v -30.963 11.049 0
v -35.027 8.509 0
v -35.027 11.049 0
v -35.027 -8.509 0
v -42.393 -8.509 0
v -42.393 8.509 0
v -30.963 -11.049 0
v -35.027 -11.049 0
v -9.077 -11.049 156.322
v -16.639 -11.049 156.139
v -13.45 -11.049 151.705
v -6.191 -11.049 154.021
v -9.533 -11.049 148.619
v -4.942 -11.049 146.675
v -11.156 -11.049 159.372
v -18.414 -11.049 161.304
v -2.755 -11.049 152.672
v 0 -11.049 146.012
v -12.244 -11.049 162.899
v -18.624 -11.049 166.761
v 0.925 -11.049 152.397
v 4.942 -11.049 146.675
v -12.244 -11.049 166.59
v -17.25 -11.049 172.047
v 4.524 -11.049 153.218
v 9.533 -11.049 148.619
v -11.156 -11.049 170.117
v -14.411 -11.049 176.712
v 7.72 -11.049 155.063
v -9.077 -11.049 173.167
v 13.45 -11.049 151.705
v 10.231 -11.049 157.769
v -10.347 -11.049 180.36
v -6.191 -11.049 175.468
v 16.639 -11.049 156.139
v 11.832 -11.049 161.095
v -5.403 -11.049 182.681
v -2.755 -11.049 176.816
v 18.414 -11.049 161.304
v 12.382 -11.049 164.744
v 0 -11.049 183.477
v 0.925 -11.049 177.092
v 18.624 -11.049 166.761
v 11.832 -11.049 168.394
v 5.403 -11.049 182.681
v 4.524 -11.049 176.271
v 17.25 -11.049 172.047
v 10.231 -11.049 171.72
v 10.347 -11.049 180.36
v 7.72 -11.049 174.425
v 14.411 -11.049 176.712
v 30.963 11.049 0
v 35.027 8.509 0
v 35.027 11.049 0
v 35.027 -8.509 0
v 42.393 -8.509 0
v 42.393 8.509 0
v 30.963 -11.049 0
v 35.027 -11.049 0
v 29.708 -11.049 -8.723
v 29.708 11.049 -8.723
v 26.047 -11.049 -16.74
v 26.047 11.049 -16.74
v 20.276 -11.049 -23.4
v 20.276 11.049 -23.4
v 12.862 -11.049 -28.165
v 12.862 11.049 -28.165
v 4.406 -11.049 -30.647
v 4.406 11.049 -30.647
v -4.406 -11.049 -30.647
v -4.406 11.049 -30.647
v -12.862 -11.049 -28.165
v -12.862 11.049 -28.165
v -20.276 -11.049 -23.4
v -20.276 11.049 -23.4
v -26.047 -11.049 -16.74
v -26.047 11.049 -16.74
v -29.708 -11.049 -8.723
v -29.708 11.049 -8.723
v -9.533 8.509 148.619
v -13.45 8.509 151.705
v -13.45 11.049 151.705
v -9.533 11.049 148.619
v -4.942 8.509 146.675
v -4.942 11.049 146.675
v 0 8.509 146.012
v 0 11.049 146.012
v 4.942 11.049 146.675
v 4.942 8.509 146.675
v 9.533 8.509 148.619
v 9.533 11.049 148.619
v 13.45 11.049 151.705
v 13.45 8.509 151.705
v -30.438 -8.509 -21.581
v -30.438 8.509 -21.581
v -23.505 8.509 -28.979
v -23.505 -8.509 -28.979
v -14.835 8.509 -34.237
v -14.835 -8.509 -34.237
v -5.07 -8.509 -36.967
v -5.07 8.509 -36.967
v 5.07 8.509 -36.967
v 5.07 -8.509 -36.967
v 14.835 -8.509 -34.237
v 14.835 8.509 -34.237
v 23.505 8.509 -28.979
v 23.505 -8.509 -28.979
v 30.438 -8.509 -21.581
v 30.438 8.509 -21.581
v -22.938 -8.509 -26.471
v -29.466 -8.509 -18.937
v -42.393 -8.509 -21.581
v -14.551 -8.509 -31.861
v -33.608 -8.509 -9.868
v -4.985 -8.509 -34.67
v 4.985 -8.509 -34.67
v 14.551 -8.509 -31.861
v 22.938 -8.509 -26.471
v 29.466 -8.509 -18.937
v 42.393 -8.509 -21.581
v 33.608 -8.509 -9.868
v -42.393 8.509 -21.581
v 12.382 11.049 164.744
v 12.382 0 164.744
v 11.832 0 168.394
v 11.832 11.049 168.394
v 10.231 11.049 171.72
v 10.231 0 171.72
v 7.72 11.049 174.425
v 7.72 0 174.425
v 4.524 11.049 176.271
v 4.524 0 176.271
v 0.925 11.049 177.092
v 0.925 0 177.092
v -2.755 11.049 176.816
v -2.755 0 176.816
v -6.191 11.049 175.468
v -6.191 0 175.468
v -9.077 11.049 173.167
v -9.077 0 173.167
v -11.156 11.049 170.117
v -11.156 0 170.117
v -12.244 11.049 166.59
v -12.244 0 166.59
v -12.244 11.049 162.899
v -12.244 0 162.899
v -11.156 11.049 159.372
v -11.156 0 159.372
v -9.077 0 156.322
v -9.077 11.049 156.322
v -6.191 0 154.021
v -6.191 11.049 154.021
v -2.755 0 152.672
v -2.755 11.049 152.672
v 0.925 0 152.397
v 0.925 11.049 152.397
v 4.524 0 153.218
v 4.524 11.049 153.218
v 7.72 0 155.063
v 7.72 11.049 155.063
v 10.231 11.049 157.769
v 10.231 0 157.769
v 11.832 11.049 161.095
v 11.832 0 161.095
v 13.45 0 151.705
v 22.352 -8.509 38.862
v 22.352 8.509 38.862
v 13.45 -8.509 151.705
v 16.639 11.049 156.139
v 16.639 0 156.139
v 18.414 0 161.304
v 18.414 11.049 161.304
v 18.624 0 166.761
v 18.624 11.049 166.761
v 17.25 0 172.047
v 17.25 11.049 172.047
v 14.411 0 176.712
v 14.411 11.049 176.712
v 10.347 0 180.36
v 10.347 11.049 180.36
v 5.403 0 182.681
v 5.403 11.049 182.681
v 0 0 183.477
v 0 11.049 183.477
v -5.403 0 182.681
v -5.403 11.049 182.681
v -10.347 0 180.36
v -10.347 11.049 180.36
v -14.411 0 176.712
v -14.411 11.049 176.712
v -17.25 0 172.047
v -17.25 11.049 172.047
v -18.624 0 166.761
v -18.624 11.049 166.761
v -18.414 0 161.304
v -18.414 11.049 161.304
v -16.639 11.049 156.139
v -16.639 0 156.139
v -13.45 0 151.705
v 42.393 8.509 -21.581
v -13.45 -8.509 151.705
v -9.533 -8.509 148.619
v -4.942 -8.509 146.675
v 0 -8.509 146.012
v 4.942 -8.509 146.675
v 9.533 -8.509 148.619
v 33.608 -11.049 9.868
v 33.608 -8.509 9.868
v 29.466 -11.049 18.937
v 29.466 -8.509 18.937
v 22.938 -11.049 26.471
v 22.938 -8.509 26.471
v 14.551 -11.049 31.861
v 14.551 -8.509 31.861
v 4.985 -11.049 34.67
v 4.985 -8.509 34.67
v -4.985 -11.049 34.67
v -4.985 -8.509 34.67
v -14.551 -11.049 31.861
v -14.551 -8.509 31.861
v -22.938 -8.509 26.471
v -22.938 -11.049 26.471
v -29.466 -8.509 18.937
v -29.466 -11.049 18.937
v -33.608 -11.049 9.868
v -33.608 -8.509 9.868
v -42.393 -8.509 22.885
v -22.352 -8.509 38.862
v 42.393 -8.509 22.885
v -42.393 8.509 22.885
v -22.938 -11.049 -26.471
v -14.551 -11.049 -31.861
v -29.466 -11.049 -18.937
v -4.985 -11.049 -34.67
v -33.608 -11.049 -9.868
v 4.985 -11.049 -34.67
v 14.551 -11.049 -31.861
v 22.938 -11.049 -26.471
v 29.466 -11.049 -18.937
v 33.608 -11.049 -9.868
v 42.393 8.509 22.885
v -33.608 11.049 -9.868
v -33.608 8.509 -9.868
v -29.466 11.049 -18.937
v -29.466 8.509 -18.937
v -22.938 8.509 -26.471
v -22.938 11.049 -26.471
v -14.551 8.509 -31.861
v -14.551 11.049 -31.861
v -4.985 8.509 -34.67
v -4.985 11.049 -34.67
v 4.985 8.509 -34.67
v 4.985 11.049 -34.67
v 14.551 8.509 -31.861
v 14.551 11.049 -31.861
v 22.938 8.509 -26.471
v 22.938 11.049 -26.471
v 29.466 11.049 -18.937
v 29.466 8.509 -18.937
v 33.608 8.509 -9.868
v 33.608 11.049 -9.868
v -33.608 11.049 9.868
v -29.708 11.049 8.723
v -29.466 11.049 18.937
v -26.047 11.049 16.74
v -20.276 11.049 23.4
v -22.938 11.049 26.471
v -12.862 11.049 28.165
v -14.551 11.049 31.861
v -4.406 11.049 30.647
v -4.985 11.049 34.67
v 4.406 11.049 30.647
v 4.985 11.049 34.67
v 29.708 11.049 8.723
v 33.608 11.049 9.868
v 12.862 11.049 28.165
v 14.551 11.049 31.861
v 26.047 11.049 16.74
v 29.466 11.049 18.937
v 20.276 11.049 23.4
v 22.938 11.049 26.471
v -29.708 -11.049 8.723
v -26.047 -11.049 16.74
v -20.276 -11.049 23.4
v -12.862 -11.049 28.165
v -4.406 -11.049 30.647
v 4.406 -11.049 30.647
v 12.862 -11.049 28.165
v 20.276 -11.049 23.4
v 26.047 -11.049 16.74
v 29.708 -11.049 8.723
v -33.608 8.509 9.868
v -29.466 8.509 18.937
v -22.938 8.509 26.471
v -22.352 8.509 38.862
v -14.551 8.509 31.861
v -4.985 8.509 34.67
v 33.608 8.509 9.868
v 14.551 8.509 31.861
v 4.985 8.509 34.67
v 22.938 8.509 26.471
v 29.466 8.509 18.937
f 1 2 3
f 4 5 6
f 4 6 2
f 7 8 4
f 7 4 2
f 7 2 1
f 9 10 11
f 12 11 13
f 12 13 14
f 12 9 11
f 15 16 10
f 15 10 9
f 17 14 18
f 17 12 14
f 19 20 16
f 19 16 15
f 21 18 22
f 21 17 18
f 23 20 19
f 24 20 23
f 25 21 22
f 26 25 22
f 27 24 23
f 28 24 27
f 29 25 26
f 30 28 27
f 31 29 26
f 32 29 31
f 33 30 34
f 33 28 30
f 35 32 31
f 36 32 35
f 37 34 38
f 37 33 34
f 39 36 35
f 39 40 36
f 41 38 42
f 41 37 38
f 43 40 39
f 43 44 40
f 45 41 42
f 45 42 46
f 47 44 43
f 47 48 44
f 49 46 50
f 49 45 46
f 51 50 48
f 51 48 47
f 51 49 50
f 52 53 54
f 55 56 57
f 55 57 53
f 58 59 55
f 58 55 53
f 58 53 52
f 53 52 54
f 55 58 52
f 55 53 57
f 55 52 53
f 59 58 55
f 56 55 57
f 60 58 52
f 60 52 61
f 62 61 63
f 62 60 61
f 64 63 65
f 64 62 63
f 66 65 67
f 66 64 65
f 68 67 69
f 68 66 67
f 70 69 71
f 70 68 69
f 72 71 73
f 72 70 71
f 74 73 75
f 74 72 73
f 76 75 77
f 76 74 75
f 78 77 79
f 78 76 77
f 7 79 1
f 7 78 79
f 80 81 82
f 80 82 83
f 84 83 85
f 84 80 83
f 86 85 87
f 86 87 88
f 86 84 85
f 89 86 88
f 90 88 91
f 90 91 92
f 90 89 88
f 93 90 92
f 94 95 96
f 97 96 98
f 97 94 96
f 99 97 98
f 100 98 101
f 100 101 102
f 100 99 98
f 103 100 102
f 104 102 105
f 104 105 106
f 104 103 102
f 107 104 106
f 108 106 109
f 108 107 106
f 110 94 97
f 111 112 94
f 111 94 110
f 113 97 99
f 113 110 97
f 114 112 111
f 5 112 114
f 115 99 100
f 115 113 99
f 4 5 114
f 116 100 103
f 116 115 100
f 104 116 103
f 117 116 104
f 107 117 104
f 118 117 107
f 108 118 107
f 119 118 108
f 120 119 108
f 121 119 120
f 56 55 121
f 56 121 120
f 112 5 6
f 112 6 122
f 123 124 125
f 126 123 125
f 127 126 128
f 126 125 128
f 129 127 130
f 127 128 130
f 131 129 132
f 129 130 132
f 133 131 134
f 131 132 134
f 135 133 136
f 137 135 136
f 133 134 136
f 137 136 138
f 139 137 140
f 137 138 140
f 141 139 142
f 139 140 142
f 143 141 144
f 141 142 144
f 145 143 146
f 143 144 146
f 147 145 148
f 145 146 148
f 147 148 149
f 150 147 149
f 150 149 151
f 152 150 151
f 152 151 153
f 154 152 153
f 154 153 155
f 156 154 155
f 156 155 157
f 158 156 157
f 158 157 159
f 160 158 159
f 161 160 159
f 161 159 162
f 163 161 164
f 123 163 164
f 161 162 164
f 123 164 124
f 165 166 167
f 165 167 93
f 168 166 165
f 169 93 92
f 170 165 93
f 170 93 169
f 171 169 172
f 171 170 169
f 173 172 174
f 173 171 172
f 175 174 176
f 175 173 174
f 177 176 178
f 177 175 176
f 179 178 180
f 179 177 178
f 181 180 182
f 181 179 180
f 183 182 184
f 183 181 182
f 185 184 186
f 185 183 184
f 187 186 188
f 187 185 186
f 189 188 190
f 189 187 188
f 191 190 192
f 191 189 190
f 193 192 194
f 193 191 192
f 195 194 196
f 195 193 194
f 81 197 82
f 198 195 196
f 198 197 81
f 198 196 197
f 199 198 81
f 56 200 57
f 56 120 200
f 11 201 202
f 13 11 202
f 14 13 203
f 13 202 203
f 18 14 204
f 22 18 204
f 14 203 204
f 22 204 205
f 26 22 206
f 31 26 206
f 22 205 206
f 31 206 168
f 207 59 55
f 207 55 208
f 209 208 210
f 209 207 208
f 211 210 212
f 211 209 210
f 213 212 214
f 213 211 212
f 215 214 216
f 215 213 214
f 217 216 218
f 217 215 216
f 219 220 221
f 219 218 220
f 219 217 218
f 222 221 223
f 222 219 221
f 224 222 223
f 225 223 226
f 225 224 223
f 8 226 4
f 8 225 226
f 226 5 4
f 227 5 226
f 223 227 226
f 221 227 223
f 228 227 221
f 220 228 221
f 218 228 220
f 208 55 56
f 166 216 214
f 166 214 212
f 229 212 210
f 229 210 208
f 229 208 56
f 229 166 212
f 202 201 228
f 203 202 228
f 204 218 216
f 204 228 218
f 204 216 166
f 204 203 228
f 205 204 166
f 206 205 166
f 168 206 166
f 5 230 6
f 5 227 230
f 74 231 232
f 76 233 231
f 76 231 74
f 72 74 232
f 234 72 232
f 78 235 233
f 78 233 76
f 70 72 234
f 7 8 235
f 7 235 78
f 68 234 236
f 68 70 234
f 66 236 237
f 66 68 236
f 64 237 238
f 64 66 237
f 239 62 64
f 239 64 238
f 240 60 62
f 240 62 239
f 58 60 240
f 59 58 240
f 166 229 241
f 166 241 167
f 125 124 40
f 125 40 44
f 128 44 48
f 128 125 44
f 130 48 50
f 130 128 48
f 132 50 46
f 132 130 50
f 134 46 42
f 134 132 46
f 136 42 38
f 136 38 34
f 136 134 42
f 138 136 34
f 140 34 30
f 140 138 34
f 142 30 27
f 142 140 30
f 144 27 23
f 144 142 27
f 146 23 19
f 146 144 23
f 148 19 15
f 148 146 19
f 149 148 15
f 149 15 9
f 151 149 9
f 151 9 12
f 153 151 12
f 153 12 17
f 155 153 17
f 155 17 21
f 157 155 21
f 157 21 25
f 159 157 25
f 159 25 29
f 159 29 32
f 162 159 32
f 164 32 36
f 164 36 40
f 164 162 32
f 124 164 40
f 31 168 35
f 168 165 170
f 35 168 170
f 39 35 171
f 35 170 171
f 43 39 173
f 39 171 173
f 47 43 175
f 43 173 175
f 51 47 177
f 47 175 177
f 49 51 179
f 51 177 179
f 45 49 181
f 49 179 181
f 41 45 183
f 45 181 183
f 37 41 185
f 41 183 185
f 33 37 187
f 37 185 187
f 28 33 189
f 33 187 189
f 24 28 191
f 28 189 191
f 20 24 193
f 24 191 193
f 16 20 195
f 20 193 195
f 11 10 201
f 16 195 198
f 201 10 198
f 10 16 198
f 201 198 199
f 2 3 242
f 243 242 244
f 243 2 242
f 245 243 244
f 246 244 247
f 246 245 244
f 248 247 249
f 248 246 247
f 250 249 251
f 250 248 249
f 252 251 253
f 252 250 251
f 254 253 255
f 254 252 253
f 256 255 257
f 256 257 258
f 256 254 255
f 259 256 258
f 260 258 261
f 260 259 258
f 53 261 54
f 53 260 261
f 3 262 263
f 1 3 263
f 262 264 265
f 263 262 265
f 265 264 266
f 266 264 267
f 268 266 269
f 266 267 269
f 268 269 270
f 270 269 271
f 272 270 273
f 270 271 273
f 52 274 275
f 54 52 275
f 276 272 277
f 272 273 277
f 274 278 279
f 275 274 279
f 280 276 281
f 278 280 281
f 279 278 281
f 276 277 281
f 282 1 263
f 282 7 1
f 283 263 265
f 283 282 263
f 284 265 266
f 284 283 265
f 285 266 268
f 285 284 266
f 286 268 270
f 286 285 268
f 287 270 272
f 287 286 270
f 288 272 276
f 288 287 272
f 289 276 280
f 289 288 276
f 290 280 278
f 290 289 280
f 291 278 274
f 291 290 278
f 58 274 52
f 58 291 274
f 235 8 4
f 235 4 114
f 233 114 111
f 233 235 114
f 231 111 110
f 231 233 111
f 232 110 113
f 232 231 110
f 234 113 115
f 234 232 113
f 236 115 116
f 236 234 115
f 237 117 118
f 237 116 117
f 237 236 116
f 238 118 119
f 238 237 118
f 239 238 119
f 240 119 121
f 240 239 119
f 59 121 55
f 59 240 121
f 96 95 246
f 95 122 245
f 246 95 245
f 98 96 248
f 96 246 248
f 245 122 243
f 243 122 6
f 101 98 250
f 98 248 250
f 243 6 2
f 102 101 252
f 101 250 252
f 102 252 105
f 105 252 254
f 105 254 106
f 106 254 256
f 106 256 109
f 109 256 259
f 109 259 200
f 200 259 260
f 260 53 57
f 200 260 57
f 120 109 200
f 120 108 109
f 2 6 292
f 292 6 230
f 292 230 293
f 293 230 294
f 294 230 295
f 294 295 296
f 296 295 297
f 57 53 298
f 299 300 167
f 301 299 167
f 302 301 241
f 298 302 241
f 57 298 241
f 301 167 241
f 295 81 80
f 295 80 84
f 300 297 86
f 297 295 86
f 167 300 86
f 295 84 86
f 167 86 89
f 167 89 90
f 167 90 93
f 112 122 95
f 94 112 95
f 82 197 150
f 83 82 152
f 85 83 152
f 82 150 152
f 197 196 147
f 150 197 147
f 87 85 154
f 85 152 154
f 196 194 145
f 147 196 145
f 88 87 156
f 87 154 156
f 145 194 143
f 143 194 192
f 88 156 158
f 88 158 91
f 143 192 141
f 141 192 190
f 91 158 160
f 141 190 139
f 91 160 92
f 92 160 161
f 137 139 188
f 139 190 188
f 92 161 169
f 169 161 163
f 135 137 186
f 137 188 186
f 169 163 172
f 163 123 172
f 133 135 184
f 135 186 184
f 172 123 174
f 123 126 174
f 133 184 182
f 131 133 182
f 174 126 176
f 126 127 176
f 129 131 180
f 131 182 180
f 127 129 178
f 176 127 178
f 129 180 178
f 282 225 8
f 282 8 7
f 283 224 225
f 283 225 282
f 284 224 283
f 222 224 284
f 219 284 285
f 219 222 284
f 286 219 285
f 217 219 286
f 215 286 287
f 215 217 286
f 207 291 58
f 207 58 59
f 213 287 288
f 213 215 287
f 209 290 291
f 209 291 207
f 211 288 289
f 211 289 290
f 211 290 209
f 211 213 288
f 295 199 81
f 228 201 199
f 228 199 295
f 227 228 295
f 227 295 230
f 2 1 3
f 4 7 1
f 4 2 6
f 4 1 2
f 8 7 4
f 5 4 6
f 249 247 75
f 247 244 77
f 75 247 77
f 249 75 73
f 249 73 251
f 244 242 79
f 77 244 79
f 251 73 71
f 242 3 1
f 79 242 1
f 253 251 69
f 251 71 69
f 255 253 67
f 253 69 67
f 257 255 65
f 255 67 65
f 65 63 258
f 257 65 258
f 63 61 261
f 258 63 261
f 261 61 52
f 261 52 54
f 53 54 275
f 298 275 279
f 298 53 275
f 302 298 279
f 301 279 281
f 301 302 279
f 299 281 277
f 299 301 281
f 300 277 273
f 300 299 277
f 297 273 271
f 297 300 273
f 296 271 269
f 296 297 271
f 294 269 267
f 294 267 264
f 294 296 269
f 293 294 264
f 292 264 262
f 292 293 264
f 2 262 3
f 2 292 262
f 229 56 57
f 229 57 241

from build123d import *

# Parameters (mm, degrees)
F1_DEPTH = 11.049
F2_DEPTH = 11.049
F3_DEPTH = 8.509
F0_R     = 12.3825
F4_DEPTH = 11.049
F5_DEPTH = 8.509


with BuildPart() as f1:
    # F0 (on Front) → F1 (new body, symmetric)
    with BuildSketch(Plane.XZ):
        with BuildLine():
            ThreePointArc((-30.9626, 0), (0, 30.9626), (30.9626, 0))
            Line((30.9626, 0), (35.0266, 0))
            ThreePointArc((35.0266, 0), (0, 35.0266), (-35.0266, 0))
            Line((-35.0266, 0), (-30.9626, 0))
        make_face()
    extrude(amount=F1_DEPTH, both=True)

    # F0 (on Front) → F3 (join, symmetric)
    with BuildSketch(Plane.XZ):
        with BuildLine():
            ThreePointArc((-35.0266, 0), (0, 35.0266), (35.0266, 0))
            Line((35.0266, 0), (42.3926, 0))
            Line((42.3926, 0), (42.3926, 22.8854))
            Line((42.3926, 22.8854), (22.352, 38.862))
            Line((22.352, 38.862), (13.4496324754, 151.7054605291))
            ThreePointArc((13.4496324754, 151.7054605291), (0, 146.0119), (-13.4496324754, 151.7054605291))
            Line((-13.4496324754, 151.7054605291), (-22.352, 38.862))
            Line((-22.352, 38.862), (-42.3926, 22.8854))
            Line((-42.3926, 22.8854), (-42.3926, 0))
            Line((-42.3926, 0), (-35.0266, 0))
        make_face()
    extrude(amount=F3_DEPTH, both=True)

    # F0 (on Front) → F4 (join, symmetric)
    with BuildSketch(Plane.XZ):
        with BuildLine():
            ThreePointArc((-13.4496324754, 151.7054605291), (0, 146.0119), (13.4496324754, 151.7054605291))
            ThreePointArc((13.4496324754, 151.7054605291), (17.361621419, 157.710151074), (18.7325, 164.7444))
            ThreePointArc((18.7325, 164.7444), (-7.034248926, 182.106021419), (-13.4496324754, 151.7054605291))
        make_face()
        with Locations((0, 164.7444)):
            Circle(F0_R, mode=Mode.SUBTRACT)
    extrude(amount=F4_DEPTH, both=True)


with BuildPart() as f2:
    # F0 (on Front) → F2 (new body, symmetric)
    with BuildSketch(Plane.XZ):
        with BuildLine():
            Line((35.0266, 0), (30.9626, 0))
            ThreePointArc((30.9626, 0), (0, -30.9626), (-30.9626, 0))
            Line((-30.9626, 0), (-35.0266, 0))
            ThreePointArc((-35.0266, 0), (0, -35.0266), (35.0266, 0))
        make_face()
    extrude(amount=F2_DEPTH, both=True)

    # F0 (on Front) → F5 (join, symmetric)
    with BuildSketch(Plane.XZ):
        with BuildLine():
            Line((42.3926, 0), (35.0266, 0))
            ThreePointArc((35.0266, 0), (0, -35.0266), (-35.0266, 0))
            Line((-35.0266, 0), (-42.3926, 0))
            Line((-42.3926, 0), (-42.3926, -21.580753848))
            Line((-42.3926, -21.580753848), (-30.4384819285, -21.580753848))
            ThreePointArc((-30.4384819285, -21.580753848), (0, -37.3126), (30.4384819285, -21.580753848))
            Line((30.4384819285, -21.580753848), (42.3926, -21.580753848))
            Line((42.3926, -21.580753848), (42.3926, 0))
        make_face()
    extrude(amount=F5_DEPTH, both=True)


solid = Compound([f1.part, f2.part])
